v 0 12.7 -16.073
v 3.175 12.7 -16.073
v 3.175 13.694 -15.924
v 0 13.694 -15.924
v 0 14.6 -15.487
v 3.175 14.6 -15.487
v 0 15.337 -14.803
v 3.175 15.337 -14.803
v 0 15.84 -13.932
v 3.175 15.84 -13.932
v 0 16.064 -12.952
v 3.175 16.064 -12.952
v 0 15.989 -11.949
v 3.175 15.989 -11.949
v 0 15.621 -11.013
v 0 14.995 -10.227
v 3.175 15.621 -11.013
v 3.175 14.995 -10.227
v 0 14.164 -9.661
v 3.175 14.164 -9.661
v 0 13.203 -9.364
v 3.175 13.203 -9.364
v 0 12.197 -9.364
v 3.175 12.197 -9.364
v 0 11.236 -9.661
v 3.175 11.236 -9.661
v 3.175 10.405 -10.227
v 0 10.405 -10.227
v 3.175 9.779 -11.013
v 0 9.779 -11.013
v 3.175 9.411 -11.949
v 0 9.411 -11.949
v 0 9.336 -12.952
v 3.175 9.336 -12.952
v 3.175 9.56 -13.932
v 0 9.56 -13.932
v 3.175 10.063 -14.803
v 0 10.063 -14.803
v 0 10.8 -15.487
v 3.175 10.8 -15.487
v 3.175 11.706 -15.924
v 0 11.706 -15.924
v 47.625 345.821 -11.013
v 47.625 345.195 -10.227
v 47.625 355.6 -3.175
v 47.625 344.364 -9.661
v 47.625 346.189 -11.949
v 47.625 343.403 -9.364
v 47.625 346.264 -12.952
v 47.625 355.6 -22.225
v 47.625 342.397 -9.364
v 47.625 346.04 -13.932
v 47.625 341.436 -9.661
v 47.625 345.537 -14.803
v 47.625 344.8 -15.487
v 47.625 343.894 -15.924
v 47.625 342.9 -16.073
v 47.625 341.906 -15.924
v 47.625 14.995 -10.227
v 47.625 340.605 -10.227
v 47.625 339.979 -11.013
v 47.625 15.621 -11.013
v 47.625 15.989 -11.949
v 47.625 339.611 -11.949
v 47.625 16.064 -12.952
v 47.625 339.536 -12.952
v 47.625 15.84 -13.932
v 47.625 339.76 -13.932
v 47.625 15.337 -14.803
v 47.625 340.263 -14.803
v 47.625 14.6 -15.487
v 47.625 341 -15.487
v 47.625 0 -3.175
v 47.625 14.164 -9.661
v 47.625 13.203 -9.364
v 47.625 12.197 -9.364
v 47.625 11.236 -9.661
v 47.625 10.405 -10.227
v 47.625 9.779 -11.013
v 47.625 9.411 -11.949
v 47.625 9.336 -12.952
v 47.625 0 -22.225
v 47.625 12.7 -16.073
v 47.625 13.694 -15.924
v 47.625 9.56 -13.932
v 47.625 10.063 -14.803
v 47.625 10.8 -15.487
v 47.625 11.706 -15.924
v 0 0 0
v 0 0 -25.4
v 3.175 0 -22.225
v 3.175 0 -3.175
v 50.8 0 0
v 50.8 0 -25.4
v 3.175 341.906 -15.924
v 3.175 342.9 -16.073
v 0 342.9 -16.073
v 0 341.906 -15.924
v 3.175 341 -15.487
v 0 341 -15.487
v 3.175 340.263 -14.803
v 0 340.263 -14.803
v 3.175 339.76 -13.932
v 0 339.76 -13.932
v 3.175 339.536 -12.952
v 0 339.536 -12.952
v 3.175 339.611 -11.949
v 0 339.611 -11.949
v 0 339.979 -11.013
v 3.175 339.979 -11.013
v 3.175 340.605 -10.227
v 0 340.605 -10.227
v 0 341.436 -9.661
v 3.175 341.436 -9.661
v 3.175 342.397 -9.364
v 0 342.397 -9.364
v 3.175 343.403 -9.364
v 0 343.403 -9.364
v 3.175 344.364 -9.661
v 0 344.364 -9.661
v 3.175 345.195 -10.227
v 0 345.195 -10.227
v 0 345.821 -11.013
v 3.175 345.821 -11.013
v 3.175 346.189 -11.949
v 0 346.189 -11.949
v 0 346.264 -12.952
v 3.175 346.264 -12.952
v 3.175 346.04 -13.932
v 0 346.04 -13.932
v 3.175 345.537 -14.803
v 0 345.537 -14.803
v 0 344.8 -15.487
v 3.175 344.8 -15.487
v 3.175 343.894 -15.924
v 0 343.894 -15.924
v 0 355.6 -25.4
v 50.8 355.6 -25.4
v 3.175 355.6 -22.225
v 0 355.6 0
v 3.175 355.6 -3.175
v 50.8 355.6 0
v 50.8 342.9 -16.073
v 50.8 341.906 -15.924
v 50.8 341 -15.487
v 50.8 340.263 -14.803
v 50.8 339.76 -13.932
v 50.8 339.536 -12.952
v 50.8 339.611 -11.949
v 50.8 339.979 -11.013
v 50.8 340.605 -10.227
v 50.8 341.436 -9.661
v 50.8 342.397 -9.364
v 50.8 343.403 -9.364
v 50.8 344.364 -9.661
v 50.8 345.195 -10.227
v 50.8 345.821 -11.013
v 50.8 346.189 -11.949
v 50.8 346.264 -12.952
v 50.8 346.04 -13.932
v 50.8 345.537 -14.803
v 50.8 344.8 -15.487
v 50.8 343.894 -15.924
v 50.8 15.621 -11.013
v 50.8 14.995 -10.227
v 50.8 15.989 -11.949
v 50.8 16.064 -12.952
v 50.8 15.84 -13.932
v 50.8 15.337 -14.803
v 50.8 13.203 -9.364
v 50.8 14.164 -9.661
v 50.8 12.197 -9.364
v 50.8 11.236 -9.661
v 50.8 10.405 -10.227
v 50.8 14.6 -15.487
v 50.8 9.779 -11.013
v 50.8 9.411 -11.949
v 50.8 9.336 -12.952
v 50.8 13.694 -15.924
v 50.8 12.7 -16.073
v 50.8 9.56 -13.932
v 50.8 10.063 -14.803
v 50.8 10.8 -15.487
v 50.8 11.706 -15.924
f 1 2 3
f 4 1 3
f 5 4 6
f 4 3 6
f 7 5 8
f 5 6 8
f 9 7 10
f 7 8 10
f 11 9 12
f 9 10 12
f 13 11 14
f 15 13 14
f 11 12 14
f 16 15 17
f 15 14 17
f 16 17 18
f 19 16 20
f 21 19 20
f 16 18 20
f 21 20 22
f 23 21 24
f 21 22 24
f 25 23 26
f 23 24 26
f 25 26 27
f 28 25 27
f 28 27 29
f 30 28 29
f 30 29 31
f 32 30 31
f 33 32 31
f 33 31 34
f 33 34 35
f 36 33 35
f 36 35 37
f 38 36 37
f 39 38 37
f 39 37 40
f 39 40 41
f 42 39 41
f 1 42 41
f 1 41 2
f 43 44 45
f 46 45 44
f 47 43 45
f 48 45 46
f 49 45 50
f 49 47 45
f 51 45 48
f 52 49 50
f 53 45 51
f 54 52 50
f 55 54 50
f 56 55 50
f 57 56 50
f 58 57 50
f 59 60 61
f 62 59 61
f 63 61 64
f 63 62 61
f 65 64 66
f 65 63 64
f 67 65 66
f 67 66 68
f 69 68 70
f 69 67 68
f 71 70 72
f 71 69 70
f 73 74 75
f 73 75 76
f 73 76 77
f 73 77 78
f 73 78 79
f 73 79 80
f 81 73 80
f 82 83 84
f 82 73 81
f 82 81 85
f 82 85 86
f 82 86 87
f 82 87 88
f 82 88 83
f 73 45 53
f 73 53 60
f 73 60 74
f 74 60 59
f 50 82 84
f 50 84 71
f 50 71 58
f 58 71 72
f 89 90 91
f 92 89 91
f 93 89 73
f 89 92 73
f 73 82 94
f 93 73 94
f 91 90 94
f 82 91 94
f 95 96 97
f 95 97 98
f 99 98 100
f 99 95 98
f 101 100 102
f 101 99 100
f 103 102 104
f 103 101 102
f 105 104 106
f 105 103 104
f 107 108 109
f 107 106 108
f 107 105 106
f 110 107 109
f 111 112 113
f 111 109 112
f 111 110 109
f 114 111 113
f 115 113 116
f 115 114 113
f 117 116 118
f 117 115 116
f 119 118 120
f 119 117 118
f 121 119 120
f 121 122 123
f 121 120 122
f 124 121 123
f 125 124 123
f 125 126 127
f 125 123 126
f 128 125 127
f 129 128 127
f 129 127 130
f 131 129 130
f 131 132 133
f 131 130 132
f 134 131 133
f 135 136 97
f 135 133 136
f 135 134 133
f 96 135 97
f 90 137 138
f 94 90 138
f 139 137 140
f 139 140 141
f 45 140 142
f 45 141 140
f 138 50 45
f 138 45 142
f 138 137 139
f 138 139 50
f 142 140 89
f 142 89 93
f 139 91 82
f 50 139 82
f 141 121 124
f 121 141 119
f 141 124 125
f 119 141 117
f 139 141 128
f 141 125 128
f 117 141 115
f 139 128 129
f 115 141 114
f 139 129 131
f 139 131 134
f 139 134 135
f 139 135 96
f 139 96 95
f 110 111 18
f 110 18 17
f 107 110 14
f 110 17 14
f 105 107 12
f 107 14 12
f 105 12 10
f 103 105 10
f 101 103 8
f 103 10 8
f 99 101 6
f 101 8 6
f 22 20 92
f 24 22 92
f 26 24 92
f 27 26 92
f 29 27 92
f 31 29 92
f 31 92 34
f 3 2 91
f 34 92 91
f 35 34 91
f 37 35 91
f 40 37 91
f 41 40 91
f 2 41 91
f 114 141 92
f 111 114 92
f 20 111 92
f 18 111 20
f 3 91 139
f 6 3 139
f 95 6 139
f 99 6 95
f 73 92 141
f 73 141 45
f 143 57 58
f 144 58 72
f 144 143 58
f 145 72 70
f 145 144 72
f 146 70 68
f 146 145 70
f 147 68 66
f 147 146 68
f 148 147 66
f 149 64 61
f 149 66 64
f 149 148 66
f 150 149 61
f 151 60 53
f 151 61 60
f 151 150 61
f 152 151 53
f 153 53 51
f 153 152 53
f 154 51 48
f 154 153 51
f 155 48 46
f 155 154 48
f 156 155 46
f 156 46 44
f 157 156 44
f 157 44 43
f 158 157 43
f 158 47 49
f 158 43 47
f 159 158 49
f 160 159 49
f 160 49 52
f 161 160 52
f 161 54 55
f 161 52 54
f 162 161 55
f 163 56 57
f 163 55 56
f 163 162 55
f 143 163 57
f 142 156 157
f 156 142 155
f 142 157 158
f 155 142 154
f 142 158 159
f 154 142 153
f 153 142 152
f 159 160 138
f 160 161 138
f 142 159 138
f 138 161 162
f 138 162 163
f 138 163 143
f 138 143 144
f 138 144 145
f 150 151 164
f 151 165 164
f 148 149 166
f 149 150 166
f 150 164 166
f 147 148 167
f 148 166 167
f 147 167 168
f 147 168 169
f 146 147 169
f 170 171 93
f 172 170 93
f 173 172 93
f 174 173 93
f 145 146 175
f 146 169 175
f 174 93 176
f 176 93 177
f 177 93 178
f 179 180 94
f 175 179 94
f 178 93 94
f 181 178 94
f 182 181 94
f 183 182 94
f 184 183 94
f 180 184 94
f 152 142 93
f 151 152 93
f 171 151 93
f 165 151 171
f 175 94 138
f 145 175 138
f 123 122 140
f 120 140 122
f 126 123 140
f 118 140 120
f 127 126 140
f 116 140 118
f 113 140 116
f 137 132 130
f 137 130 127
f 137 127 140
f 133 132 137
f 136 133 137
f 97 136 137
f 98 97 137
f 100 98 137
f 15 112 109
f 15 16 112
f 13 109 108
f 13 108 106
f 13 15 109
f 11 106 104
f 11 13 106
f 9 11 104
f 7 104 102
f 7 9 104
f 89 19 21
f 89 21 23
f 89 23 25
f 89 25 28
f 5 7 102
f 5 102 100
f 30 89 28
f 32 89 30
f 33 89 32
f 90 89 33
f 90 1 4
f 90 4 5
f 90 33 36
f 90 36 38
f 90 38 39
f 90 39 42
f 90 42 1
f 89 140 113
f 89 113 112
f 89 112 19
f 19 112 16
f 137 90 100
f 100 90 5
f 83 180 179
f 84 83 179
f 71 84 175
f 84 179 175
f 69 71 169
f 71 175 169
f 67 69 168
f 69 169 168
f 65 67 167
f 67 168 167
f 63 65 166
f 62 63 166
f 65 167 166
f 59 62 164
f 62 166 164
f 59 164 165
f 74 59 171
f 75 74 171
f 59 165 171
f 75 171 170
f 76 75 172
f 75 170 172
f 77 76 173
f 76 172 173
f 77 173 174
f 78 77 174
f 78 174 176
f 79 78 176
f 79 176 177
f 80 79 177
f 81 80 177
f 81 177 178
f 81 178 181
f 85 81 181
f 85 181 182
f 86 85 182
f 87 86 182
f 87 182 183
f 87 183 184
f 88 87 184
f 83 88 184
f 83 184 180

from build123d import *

# Parameters (mm, degrees)
SKETCH1_W           = 50.8
SKETCH1_H           = 25.4
SKETCH1_W_2         = 44.45
SKETCH1_H_2         = 19.05
BOSS_EXTRUDE1_DEPTH = 355.6
SKETCH2_R           = 3.3734375
CUT_EXTRUDE1_DEPTH  = 361.10715072


with BuildPart() as part:
    # Sketch1 → Boss-Extrude1 (new body)
    with BuildSketch(Plane(origin=(0, 0, 0), x_dir=(1, 0, 0), z_dir=(0, 1, 0))):
        with Locations((25.4, 12.7)):
            Rectangle(SKETCH1_W, SKETCH1_H)
        with Locations((25.4, 12.7)):
            Rectangle(SKETCH1_W_2, SKETCH1_H_2, mode=Mode.SUBTRACT)
    extrude(amount=BOSS_EXTRUDE1_DEPTH)

    # Sketch2 → Cut-Extrude1 (cut, through all)
    with BuildSketch(Plane(origin=(50.8, 0, 0), x_dir=(0, 0, -1), z_dir=(1, 0, 0))):
        with Locations((12.7, 12.7)):
            Circle(SKETCH2_R)
    cut_extrude1 = extrude(amount=-CUT_EXTRUDE1_DEPTH, mode=Mode.SUBTRACT)

    # Mirror1: Cut-Extrude1 across plane
    add(cut_extrude1.mirror(Plane.ZX.offset(177.8)), mode=Mode.SUBTRACT)


solid = part.part
